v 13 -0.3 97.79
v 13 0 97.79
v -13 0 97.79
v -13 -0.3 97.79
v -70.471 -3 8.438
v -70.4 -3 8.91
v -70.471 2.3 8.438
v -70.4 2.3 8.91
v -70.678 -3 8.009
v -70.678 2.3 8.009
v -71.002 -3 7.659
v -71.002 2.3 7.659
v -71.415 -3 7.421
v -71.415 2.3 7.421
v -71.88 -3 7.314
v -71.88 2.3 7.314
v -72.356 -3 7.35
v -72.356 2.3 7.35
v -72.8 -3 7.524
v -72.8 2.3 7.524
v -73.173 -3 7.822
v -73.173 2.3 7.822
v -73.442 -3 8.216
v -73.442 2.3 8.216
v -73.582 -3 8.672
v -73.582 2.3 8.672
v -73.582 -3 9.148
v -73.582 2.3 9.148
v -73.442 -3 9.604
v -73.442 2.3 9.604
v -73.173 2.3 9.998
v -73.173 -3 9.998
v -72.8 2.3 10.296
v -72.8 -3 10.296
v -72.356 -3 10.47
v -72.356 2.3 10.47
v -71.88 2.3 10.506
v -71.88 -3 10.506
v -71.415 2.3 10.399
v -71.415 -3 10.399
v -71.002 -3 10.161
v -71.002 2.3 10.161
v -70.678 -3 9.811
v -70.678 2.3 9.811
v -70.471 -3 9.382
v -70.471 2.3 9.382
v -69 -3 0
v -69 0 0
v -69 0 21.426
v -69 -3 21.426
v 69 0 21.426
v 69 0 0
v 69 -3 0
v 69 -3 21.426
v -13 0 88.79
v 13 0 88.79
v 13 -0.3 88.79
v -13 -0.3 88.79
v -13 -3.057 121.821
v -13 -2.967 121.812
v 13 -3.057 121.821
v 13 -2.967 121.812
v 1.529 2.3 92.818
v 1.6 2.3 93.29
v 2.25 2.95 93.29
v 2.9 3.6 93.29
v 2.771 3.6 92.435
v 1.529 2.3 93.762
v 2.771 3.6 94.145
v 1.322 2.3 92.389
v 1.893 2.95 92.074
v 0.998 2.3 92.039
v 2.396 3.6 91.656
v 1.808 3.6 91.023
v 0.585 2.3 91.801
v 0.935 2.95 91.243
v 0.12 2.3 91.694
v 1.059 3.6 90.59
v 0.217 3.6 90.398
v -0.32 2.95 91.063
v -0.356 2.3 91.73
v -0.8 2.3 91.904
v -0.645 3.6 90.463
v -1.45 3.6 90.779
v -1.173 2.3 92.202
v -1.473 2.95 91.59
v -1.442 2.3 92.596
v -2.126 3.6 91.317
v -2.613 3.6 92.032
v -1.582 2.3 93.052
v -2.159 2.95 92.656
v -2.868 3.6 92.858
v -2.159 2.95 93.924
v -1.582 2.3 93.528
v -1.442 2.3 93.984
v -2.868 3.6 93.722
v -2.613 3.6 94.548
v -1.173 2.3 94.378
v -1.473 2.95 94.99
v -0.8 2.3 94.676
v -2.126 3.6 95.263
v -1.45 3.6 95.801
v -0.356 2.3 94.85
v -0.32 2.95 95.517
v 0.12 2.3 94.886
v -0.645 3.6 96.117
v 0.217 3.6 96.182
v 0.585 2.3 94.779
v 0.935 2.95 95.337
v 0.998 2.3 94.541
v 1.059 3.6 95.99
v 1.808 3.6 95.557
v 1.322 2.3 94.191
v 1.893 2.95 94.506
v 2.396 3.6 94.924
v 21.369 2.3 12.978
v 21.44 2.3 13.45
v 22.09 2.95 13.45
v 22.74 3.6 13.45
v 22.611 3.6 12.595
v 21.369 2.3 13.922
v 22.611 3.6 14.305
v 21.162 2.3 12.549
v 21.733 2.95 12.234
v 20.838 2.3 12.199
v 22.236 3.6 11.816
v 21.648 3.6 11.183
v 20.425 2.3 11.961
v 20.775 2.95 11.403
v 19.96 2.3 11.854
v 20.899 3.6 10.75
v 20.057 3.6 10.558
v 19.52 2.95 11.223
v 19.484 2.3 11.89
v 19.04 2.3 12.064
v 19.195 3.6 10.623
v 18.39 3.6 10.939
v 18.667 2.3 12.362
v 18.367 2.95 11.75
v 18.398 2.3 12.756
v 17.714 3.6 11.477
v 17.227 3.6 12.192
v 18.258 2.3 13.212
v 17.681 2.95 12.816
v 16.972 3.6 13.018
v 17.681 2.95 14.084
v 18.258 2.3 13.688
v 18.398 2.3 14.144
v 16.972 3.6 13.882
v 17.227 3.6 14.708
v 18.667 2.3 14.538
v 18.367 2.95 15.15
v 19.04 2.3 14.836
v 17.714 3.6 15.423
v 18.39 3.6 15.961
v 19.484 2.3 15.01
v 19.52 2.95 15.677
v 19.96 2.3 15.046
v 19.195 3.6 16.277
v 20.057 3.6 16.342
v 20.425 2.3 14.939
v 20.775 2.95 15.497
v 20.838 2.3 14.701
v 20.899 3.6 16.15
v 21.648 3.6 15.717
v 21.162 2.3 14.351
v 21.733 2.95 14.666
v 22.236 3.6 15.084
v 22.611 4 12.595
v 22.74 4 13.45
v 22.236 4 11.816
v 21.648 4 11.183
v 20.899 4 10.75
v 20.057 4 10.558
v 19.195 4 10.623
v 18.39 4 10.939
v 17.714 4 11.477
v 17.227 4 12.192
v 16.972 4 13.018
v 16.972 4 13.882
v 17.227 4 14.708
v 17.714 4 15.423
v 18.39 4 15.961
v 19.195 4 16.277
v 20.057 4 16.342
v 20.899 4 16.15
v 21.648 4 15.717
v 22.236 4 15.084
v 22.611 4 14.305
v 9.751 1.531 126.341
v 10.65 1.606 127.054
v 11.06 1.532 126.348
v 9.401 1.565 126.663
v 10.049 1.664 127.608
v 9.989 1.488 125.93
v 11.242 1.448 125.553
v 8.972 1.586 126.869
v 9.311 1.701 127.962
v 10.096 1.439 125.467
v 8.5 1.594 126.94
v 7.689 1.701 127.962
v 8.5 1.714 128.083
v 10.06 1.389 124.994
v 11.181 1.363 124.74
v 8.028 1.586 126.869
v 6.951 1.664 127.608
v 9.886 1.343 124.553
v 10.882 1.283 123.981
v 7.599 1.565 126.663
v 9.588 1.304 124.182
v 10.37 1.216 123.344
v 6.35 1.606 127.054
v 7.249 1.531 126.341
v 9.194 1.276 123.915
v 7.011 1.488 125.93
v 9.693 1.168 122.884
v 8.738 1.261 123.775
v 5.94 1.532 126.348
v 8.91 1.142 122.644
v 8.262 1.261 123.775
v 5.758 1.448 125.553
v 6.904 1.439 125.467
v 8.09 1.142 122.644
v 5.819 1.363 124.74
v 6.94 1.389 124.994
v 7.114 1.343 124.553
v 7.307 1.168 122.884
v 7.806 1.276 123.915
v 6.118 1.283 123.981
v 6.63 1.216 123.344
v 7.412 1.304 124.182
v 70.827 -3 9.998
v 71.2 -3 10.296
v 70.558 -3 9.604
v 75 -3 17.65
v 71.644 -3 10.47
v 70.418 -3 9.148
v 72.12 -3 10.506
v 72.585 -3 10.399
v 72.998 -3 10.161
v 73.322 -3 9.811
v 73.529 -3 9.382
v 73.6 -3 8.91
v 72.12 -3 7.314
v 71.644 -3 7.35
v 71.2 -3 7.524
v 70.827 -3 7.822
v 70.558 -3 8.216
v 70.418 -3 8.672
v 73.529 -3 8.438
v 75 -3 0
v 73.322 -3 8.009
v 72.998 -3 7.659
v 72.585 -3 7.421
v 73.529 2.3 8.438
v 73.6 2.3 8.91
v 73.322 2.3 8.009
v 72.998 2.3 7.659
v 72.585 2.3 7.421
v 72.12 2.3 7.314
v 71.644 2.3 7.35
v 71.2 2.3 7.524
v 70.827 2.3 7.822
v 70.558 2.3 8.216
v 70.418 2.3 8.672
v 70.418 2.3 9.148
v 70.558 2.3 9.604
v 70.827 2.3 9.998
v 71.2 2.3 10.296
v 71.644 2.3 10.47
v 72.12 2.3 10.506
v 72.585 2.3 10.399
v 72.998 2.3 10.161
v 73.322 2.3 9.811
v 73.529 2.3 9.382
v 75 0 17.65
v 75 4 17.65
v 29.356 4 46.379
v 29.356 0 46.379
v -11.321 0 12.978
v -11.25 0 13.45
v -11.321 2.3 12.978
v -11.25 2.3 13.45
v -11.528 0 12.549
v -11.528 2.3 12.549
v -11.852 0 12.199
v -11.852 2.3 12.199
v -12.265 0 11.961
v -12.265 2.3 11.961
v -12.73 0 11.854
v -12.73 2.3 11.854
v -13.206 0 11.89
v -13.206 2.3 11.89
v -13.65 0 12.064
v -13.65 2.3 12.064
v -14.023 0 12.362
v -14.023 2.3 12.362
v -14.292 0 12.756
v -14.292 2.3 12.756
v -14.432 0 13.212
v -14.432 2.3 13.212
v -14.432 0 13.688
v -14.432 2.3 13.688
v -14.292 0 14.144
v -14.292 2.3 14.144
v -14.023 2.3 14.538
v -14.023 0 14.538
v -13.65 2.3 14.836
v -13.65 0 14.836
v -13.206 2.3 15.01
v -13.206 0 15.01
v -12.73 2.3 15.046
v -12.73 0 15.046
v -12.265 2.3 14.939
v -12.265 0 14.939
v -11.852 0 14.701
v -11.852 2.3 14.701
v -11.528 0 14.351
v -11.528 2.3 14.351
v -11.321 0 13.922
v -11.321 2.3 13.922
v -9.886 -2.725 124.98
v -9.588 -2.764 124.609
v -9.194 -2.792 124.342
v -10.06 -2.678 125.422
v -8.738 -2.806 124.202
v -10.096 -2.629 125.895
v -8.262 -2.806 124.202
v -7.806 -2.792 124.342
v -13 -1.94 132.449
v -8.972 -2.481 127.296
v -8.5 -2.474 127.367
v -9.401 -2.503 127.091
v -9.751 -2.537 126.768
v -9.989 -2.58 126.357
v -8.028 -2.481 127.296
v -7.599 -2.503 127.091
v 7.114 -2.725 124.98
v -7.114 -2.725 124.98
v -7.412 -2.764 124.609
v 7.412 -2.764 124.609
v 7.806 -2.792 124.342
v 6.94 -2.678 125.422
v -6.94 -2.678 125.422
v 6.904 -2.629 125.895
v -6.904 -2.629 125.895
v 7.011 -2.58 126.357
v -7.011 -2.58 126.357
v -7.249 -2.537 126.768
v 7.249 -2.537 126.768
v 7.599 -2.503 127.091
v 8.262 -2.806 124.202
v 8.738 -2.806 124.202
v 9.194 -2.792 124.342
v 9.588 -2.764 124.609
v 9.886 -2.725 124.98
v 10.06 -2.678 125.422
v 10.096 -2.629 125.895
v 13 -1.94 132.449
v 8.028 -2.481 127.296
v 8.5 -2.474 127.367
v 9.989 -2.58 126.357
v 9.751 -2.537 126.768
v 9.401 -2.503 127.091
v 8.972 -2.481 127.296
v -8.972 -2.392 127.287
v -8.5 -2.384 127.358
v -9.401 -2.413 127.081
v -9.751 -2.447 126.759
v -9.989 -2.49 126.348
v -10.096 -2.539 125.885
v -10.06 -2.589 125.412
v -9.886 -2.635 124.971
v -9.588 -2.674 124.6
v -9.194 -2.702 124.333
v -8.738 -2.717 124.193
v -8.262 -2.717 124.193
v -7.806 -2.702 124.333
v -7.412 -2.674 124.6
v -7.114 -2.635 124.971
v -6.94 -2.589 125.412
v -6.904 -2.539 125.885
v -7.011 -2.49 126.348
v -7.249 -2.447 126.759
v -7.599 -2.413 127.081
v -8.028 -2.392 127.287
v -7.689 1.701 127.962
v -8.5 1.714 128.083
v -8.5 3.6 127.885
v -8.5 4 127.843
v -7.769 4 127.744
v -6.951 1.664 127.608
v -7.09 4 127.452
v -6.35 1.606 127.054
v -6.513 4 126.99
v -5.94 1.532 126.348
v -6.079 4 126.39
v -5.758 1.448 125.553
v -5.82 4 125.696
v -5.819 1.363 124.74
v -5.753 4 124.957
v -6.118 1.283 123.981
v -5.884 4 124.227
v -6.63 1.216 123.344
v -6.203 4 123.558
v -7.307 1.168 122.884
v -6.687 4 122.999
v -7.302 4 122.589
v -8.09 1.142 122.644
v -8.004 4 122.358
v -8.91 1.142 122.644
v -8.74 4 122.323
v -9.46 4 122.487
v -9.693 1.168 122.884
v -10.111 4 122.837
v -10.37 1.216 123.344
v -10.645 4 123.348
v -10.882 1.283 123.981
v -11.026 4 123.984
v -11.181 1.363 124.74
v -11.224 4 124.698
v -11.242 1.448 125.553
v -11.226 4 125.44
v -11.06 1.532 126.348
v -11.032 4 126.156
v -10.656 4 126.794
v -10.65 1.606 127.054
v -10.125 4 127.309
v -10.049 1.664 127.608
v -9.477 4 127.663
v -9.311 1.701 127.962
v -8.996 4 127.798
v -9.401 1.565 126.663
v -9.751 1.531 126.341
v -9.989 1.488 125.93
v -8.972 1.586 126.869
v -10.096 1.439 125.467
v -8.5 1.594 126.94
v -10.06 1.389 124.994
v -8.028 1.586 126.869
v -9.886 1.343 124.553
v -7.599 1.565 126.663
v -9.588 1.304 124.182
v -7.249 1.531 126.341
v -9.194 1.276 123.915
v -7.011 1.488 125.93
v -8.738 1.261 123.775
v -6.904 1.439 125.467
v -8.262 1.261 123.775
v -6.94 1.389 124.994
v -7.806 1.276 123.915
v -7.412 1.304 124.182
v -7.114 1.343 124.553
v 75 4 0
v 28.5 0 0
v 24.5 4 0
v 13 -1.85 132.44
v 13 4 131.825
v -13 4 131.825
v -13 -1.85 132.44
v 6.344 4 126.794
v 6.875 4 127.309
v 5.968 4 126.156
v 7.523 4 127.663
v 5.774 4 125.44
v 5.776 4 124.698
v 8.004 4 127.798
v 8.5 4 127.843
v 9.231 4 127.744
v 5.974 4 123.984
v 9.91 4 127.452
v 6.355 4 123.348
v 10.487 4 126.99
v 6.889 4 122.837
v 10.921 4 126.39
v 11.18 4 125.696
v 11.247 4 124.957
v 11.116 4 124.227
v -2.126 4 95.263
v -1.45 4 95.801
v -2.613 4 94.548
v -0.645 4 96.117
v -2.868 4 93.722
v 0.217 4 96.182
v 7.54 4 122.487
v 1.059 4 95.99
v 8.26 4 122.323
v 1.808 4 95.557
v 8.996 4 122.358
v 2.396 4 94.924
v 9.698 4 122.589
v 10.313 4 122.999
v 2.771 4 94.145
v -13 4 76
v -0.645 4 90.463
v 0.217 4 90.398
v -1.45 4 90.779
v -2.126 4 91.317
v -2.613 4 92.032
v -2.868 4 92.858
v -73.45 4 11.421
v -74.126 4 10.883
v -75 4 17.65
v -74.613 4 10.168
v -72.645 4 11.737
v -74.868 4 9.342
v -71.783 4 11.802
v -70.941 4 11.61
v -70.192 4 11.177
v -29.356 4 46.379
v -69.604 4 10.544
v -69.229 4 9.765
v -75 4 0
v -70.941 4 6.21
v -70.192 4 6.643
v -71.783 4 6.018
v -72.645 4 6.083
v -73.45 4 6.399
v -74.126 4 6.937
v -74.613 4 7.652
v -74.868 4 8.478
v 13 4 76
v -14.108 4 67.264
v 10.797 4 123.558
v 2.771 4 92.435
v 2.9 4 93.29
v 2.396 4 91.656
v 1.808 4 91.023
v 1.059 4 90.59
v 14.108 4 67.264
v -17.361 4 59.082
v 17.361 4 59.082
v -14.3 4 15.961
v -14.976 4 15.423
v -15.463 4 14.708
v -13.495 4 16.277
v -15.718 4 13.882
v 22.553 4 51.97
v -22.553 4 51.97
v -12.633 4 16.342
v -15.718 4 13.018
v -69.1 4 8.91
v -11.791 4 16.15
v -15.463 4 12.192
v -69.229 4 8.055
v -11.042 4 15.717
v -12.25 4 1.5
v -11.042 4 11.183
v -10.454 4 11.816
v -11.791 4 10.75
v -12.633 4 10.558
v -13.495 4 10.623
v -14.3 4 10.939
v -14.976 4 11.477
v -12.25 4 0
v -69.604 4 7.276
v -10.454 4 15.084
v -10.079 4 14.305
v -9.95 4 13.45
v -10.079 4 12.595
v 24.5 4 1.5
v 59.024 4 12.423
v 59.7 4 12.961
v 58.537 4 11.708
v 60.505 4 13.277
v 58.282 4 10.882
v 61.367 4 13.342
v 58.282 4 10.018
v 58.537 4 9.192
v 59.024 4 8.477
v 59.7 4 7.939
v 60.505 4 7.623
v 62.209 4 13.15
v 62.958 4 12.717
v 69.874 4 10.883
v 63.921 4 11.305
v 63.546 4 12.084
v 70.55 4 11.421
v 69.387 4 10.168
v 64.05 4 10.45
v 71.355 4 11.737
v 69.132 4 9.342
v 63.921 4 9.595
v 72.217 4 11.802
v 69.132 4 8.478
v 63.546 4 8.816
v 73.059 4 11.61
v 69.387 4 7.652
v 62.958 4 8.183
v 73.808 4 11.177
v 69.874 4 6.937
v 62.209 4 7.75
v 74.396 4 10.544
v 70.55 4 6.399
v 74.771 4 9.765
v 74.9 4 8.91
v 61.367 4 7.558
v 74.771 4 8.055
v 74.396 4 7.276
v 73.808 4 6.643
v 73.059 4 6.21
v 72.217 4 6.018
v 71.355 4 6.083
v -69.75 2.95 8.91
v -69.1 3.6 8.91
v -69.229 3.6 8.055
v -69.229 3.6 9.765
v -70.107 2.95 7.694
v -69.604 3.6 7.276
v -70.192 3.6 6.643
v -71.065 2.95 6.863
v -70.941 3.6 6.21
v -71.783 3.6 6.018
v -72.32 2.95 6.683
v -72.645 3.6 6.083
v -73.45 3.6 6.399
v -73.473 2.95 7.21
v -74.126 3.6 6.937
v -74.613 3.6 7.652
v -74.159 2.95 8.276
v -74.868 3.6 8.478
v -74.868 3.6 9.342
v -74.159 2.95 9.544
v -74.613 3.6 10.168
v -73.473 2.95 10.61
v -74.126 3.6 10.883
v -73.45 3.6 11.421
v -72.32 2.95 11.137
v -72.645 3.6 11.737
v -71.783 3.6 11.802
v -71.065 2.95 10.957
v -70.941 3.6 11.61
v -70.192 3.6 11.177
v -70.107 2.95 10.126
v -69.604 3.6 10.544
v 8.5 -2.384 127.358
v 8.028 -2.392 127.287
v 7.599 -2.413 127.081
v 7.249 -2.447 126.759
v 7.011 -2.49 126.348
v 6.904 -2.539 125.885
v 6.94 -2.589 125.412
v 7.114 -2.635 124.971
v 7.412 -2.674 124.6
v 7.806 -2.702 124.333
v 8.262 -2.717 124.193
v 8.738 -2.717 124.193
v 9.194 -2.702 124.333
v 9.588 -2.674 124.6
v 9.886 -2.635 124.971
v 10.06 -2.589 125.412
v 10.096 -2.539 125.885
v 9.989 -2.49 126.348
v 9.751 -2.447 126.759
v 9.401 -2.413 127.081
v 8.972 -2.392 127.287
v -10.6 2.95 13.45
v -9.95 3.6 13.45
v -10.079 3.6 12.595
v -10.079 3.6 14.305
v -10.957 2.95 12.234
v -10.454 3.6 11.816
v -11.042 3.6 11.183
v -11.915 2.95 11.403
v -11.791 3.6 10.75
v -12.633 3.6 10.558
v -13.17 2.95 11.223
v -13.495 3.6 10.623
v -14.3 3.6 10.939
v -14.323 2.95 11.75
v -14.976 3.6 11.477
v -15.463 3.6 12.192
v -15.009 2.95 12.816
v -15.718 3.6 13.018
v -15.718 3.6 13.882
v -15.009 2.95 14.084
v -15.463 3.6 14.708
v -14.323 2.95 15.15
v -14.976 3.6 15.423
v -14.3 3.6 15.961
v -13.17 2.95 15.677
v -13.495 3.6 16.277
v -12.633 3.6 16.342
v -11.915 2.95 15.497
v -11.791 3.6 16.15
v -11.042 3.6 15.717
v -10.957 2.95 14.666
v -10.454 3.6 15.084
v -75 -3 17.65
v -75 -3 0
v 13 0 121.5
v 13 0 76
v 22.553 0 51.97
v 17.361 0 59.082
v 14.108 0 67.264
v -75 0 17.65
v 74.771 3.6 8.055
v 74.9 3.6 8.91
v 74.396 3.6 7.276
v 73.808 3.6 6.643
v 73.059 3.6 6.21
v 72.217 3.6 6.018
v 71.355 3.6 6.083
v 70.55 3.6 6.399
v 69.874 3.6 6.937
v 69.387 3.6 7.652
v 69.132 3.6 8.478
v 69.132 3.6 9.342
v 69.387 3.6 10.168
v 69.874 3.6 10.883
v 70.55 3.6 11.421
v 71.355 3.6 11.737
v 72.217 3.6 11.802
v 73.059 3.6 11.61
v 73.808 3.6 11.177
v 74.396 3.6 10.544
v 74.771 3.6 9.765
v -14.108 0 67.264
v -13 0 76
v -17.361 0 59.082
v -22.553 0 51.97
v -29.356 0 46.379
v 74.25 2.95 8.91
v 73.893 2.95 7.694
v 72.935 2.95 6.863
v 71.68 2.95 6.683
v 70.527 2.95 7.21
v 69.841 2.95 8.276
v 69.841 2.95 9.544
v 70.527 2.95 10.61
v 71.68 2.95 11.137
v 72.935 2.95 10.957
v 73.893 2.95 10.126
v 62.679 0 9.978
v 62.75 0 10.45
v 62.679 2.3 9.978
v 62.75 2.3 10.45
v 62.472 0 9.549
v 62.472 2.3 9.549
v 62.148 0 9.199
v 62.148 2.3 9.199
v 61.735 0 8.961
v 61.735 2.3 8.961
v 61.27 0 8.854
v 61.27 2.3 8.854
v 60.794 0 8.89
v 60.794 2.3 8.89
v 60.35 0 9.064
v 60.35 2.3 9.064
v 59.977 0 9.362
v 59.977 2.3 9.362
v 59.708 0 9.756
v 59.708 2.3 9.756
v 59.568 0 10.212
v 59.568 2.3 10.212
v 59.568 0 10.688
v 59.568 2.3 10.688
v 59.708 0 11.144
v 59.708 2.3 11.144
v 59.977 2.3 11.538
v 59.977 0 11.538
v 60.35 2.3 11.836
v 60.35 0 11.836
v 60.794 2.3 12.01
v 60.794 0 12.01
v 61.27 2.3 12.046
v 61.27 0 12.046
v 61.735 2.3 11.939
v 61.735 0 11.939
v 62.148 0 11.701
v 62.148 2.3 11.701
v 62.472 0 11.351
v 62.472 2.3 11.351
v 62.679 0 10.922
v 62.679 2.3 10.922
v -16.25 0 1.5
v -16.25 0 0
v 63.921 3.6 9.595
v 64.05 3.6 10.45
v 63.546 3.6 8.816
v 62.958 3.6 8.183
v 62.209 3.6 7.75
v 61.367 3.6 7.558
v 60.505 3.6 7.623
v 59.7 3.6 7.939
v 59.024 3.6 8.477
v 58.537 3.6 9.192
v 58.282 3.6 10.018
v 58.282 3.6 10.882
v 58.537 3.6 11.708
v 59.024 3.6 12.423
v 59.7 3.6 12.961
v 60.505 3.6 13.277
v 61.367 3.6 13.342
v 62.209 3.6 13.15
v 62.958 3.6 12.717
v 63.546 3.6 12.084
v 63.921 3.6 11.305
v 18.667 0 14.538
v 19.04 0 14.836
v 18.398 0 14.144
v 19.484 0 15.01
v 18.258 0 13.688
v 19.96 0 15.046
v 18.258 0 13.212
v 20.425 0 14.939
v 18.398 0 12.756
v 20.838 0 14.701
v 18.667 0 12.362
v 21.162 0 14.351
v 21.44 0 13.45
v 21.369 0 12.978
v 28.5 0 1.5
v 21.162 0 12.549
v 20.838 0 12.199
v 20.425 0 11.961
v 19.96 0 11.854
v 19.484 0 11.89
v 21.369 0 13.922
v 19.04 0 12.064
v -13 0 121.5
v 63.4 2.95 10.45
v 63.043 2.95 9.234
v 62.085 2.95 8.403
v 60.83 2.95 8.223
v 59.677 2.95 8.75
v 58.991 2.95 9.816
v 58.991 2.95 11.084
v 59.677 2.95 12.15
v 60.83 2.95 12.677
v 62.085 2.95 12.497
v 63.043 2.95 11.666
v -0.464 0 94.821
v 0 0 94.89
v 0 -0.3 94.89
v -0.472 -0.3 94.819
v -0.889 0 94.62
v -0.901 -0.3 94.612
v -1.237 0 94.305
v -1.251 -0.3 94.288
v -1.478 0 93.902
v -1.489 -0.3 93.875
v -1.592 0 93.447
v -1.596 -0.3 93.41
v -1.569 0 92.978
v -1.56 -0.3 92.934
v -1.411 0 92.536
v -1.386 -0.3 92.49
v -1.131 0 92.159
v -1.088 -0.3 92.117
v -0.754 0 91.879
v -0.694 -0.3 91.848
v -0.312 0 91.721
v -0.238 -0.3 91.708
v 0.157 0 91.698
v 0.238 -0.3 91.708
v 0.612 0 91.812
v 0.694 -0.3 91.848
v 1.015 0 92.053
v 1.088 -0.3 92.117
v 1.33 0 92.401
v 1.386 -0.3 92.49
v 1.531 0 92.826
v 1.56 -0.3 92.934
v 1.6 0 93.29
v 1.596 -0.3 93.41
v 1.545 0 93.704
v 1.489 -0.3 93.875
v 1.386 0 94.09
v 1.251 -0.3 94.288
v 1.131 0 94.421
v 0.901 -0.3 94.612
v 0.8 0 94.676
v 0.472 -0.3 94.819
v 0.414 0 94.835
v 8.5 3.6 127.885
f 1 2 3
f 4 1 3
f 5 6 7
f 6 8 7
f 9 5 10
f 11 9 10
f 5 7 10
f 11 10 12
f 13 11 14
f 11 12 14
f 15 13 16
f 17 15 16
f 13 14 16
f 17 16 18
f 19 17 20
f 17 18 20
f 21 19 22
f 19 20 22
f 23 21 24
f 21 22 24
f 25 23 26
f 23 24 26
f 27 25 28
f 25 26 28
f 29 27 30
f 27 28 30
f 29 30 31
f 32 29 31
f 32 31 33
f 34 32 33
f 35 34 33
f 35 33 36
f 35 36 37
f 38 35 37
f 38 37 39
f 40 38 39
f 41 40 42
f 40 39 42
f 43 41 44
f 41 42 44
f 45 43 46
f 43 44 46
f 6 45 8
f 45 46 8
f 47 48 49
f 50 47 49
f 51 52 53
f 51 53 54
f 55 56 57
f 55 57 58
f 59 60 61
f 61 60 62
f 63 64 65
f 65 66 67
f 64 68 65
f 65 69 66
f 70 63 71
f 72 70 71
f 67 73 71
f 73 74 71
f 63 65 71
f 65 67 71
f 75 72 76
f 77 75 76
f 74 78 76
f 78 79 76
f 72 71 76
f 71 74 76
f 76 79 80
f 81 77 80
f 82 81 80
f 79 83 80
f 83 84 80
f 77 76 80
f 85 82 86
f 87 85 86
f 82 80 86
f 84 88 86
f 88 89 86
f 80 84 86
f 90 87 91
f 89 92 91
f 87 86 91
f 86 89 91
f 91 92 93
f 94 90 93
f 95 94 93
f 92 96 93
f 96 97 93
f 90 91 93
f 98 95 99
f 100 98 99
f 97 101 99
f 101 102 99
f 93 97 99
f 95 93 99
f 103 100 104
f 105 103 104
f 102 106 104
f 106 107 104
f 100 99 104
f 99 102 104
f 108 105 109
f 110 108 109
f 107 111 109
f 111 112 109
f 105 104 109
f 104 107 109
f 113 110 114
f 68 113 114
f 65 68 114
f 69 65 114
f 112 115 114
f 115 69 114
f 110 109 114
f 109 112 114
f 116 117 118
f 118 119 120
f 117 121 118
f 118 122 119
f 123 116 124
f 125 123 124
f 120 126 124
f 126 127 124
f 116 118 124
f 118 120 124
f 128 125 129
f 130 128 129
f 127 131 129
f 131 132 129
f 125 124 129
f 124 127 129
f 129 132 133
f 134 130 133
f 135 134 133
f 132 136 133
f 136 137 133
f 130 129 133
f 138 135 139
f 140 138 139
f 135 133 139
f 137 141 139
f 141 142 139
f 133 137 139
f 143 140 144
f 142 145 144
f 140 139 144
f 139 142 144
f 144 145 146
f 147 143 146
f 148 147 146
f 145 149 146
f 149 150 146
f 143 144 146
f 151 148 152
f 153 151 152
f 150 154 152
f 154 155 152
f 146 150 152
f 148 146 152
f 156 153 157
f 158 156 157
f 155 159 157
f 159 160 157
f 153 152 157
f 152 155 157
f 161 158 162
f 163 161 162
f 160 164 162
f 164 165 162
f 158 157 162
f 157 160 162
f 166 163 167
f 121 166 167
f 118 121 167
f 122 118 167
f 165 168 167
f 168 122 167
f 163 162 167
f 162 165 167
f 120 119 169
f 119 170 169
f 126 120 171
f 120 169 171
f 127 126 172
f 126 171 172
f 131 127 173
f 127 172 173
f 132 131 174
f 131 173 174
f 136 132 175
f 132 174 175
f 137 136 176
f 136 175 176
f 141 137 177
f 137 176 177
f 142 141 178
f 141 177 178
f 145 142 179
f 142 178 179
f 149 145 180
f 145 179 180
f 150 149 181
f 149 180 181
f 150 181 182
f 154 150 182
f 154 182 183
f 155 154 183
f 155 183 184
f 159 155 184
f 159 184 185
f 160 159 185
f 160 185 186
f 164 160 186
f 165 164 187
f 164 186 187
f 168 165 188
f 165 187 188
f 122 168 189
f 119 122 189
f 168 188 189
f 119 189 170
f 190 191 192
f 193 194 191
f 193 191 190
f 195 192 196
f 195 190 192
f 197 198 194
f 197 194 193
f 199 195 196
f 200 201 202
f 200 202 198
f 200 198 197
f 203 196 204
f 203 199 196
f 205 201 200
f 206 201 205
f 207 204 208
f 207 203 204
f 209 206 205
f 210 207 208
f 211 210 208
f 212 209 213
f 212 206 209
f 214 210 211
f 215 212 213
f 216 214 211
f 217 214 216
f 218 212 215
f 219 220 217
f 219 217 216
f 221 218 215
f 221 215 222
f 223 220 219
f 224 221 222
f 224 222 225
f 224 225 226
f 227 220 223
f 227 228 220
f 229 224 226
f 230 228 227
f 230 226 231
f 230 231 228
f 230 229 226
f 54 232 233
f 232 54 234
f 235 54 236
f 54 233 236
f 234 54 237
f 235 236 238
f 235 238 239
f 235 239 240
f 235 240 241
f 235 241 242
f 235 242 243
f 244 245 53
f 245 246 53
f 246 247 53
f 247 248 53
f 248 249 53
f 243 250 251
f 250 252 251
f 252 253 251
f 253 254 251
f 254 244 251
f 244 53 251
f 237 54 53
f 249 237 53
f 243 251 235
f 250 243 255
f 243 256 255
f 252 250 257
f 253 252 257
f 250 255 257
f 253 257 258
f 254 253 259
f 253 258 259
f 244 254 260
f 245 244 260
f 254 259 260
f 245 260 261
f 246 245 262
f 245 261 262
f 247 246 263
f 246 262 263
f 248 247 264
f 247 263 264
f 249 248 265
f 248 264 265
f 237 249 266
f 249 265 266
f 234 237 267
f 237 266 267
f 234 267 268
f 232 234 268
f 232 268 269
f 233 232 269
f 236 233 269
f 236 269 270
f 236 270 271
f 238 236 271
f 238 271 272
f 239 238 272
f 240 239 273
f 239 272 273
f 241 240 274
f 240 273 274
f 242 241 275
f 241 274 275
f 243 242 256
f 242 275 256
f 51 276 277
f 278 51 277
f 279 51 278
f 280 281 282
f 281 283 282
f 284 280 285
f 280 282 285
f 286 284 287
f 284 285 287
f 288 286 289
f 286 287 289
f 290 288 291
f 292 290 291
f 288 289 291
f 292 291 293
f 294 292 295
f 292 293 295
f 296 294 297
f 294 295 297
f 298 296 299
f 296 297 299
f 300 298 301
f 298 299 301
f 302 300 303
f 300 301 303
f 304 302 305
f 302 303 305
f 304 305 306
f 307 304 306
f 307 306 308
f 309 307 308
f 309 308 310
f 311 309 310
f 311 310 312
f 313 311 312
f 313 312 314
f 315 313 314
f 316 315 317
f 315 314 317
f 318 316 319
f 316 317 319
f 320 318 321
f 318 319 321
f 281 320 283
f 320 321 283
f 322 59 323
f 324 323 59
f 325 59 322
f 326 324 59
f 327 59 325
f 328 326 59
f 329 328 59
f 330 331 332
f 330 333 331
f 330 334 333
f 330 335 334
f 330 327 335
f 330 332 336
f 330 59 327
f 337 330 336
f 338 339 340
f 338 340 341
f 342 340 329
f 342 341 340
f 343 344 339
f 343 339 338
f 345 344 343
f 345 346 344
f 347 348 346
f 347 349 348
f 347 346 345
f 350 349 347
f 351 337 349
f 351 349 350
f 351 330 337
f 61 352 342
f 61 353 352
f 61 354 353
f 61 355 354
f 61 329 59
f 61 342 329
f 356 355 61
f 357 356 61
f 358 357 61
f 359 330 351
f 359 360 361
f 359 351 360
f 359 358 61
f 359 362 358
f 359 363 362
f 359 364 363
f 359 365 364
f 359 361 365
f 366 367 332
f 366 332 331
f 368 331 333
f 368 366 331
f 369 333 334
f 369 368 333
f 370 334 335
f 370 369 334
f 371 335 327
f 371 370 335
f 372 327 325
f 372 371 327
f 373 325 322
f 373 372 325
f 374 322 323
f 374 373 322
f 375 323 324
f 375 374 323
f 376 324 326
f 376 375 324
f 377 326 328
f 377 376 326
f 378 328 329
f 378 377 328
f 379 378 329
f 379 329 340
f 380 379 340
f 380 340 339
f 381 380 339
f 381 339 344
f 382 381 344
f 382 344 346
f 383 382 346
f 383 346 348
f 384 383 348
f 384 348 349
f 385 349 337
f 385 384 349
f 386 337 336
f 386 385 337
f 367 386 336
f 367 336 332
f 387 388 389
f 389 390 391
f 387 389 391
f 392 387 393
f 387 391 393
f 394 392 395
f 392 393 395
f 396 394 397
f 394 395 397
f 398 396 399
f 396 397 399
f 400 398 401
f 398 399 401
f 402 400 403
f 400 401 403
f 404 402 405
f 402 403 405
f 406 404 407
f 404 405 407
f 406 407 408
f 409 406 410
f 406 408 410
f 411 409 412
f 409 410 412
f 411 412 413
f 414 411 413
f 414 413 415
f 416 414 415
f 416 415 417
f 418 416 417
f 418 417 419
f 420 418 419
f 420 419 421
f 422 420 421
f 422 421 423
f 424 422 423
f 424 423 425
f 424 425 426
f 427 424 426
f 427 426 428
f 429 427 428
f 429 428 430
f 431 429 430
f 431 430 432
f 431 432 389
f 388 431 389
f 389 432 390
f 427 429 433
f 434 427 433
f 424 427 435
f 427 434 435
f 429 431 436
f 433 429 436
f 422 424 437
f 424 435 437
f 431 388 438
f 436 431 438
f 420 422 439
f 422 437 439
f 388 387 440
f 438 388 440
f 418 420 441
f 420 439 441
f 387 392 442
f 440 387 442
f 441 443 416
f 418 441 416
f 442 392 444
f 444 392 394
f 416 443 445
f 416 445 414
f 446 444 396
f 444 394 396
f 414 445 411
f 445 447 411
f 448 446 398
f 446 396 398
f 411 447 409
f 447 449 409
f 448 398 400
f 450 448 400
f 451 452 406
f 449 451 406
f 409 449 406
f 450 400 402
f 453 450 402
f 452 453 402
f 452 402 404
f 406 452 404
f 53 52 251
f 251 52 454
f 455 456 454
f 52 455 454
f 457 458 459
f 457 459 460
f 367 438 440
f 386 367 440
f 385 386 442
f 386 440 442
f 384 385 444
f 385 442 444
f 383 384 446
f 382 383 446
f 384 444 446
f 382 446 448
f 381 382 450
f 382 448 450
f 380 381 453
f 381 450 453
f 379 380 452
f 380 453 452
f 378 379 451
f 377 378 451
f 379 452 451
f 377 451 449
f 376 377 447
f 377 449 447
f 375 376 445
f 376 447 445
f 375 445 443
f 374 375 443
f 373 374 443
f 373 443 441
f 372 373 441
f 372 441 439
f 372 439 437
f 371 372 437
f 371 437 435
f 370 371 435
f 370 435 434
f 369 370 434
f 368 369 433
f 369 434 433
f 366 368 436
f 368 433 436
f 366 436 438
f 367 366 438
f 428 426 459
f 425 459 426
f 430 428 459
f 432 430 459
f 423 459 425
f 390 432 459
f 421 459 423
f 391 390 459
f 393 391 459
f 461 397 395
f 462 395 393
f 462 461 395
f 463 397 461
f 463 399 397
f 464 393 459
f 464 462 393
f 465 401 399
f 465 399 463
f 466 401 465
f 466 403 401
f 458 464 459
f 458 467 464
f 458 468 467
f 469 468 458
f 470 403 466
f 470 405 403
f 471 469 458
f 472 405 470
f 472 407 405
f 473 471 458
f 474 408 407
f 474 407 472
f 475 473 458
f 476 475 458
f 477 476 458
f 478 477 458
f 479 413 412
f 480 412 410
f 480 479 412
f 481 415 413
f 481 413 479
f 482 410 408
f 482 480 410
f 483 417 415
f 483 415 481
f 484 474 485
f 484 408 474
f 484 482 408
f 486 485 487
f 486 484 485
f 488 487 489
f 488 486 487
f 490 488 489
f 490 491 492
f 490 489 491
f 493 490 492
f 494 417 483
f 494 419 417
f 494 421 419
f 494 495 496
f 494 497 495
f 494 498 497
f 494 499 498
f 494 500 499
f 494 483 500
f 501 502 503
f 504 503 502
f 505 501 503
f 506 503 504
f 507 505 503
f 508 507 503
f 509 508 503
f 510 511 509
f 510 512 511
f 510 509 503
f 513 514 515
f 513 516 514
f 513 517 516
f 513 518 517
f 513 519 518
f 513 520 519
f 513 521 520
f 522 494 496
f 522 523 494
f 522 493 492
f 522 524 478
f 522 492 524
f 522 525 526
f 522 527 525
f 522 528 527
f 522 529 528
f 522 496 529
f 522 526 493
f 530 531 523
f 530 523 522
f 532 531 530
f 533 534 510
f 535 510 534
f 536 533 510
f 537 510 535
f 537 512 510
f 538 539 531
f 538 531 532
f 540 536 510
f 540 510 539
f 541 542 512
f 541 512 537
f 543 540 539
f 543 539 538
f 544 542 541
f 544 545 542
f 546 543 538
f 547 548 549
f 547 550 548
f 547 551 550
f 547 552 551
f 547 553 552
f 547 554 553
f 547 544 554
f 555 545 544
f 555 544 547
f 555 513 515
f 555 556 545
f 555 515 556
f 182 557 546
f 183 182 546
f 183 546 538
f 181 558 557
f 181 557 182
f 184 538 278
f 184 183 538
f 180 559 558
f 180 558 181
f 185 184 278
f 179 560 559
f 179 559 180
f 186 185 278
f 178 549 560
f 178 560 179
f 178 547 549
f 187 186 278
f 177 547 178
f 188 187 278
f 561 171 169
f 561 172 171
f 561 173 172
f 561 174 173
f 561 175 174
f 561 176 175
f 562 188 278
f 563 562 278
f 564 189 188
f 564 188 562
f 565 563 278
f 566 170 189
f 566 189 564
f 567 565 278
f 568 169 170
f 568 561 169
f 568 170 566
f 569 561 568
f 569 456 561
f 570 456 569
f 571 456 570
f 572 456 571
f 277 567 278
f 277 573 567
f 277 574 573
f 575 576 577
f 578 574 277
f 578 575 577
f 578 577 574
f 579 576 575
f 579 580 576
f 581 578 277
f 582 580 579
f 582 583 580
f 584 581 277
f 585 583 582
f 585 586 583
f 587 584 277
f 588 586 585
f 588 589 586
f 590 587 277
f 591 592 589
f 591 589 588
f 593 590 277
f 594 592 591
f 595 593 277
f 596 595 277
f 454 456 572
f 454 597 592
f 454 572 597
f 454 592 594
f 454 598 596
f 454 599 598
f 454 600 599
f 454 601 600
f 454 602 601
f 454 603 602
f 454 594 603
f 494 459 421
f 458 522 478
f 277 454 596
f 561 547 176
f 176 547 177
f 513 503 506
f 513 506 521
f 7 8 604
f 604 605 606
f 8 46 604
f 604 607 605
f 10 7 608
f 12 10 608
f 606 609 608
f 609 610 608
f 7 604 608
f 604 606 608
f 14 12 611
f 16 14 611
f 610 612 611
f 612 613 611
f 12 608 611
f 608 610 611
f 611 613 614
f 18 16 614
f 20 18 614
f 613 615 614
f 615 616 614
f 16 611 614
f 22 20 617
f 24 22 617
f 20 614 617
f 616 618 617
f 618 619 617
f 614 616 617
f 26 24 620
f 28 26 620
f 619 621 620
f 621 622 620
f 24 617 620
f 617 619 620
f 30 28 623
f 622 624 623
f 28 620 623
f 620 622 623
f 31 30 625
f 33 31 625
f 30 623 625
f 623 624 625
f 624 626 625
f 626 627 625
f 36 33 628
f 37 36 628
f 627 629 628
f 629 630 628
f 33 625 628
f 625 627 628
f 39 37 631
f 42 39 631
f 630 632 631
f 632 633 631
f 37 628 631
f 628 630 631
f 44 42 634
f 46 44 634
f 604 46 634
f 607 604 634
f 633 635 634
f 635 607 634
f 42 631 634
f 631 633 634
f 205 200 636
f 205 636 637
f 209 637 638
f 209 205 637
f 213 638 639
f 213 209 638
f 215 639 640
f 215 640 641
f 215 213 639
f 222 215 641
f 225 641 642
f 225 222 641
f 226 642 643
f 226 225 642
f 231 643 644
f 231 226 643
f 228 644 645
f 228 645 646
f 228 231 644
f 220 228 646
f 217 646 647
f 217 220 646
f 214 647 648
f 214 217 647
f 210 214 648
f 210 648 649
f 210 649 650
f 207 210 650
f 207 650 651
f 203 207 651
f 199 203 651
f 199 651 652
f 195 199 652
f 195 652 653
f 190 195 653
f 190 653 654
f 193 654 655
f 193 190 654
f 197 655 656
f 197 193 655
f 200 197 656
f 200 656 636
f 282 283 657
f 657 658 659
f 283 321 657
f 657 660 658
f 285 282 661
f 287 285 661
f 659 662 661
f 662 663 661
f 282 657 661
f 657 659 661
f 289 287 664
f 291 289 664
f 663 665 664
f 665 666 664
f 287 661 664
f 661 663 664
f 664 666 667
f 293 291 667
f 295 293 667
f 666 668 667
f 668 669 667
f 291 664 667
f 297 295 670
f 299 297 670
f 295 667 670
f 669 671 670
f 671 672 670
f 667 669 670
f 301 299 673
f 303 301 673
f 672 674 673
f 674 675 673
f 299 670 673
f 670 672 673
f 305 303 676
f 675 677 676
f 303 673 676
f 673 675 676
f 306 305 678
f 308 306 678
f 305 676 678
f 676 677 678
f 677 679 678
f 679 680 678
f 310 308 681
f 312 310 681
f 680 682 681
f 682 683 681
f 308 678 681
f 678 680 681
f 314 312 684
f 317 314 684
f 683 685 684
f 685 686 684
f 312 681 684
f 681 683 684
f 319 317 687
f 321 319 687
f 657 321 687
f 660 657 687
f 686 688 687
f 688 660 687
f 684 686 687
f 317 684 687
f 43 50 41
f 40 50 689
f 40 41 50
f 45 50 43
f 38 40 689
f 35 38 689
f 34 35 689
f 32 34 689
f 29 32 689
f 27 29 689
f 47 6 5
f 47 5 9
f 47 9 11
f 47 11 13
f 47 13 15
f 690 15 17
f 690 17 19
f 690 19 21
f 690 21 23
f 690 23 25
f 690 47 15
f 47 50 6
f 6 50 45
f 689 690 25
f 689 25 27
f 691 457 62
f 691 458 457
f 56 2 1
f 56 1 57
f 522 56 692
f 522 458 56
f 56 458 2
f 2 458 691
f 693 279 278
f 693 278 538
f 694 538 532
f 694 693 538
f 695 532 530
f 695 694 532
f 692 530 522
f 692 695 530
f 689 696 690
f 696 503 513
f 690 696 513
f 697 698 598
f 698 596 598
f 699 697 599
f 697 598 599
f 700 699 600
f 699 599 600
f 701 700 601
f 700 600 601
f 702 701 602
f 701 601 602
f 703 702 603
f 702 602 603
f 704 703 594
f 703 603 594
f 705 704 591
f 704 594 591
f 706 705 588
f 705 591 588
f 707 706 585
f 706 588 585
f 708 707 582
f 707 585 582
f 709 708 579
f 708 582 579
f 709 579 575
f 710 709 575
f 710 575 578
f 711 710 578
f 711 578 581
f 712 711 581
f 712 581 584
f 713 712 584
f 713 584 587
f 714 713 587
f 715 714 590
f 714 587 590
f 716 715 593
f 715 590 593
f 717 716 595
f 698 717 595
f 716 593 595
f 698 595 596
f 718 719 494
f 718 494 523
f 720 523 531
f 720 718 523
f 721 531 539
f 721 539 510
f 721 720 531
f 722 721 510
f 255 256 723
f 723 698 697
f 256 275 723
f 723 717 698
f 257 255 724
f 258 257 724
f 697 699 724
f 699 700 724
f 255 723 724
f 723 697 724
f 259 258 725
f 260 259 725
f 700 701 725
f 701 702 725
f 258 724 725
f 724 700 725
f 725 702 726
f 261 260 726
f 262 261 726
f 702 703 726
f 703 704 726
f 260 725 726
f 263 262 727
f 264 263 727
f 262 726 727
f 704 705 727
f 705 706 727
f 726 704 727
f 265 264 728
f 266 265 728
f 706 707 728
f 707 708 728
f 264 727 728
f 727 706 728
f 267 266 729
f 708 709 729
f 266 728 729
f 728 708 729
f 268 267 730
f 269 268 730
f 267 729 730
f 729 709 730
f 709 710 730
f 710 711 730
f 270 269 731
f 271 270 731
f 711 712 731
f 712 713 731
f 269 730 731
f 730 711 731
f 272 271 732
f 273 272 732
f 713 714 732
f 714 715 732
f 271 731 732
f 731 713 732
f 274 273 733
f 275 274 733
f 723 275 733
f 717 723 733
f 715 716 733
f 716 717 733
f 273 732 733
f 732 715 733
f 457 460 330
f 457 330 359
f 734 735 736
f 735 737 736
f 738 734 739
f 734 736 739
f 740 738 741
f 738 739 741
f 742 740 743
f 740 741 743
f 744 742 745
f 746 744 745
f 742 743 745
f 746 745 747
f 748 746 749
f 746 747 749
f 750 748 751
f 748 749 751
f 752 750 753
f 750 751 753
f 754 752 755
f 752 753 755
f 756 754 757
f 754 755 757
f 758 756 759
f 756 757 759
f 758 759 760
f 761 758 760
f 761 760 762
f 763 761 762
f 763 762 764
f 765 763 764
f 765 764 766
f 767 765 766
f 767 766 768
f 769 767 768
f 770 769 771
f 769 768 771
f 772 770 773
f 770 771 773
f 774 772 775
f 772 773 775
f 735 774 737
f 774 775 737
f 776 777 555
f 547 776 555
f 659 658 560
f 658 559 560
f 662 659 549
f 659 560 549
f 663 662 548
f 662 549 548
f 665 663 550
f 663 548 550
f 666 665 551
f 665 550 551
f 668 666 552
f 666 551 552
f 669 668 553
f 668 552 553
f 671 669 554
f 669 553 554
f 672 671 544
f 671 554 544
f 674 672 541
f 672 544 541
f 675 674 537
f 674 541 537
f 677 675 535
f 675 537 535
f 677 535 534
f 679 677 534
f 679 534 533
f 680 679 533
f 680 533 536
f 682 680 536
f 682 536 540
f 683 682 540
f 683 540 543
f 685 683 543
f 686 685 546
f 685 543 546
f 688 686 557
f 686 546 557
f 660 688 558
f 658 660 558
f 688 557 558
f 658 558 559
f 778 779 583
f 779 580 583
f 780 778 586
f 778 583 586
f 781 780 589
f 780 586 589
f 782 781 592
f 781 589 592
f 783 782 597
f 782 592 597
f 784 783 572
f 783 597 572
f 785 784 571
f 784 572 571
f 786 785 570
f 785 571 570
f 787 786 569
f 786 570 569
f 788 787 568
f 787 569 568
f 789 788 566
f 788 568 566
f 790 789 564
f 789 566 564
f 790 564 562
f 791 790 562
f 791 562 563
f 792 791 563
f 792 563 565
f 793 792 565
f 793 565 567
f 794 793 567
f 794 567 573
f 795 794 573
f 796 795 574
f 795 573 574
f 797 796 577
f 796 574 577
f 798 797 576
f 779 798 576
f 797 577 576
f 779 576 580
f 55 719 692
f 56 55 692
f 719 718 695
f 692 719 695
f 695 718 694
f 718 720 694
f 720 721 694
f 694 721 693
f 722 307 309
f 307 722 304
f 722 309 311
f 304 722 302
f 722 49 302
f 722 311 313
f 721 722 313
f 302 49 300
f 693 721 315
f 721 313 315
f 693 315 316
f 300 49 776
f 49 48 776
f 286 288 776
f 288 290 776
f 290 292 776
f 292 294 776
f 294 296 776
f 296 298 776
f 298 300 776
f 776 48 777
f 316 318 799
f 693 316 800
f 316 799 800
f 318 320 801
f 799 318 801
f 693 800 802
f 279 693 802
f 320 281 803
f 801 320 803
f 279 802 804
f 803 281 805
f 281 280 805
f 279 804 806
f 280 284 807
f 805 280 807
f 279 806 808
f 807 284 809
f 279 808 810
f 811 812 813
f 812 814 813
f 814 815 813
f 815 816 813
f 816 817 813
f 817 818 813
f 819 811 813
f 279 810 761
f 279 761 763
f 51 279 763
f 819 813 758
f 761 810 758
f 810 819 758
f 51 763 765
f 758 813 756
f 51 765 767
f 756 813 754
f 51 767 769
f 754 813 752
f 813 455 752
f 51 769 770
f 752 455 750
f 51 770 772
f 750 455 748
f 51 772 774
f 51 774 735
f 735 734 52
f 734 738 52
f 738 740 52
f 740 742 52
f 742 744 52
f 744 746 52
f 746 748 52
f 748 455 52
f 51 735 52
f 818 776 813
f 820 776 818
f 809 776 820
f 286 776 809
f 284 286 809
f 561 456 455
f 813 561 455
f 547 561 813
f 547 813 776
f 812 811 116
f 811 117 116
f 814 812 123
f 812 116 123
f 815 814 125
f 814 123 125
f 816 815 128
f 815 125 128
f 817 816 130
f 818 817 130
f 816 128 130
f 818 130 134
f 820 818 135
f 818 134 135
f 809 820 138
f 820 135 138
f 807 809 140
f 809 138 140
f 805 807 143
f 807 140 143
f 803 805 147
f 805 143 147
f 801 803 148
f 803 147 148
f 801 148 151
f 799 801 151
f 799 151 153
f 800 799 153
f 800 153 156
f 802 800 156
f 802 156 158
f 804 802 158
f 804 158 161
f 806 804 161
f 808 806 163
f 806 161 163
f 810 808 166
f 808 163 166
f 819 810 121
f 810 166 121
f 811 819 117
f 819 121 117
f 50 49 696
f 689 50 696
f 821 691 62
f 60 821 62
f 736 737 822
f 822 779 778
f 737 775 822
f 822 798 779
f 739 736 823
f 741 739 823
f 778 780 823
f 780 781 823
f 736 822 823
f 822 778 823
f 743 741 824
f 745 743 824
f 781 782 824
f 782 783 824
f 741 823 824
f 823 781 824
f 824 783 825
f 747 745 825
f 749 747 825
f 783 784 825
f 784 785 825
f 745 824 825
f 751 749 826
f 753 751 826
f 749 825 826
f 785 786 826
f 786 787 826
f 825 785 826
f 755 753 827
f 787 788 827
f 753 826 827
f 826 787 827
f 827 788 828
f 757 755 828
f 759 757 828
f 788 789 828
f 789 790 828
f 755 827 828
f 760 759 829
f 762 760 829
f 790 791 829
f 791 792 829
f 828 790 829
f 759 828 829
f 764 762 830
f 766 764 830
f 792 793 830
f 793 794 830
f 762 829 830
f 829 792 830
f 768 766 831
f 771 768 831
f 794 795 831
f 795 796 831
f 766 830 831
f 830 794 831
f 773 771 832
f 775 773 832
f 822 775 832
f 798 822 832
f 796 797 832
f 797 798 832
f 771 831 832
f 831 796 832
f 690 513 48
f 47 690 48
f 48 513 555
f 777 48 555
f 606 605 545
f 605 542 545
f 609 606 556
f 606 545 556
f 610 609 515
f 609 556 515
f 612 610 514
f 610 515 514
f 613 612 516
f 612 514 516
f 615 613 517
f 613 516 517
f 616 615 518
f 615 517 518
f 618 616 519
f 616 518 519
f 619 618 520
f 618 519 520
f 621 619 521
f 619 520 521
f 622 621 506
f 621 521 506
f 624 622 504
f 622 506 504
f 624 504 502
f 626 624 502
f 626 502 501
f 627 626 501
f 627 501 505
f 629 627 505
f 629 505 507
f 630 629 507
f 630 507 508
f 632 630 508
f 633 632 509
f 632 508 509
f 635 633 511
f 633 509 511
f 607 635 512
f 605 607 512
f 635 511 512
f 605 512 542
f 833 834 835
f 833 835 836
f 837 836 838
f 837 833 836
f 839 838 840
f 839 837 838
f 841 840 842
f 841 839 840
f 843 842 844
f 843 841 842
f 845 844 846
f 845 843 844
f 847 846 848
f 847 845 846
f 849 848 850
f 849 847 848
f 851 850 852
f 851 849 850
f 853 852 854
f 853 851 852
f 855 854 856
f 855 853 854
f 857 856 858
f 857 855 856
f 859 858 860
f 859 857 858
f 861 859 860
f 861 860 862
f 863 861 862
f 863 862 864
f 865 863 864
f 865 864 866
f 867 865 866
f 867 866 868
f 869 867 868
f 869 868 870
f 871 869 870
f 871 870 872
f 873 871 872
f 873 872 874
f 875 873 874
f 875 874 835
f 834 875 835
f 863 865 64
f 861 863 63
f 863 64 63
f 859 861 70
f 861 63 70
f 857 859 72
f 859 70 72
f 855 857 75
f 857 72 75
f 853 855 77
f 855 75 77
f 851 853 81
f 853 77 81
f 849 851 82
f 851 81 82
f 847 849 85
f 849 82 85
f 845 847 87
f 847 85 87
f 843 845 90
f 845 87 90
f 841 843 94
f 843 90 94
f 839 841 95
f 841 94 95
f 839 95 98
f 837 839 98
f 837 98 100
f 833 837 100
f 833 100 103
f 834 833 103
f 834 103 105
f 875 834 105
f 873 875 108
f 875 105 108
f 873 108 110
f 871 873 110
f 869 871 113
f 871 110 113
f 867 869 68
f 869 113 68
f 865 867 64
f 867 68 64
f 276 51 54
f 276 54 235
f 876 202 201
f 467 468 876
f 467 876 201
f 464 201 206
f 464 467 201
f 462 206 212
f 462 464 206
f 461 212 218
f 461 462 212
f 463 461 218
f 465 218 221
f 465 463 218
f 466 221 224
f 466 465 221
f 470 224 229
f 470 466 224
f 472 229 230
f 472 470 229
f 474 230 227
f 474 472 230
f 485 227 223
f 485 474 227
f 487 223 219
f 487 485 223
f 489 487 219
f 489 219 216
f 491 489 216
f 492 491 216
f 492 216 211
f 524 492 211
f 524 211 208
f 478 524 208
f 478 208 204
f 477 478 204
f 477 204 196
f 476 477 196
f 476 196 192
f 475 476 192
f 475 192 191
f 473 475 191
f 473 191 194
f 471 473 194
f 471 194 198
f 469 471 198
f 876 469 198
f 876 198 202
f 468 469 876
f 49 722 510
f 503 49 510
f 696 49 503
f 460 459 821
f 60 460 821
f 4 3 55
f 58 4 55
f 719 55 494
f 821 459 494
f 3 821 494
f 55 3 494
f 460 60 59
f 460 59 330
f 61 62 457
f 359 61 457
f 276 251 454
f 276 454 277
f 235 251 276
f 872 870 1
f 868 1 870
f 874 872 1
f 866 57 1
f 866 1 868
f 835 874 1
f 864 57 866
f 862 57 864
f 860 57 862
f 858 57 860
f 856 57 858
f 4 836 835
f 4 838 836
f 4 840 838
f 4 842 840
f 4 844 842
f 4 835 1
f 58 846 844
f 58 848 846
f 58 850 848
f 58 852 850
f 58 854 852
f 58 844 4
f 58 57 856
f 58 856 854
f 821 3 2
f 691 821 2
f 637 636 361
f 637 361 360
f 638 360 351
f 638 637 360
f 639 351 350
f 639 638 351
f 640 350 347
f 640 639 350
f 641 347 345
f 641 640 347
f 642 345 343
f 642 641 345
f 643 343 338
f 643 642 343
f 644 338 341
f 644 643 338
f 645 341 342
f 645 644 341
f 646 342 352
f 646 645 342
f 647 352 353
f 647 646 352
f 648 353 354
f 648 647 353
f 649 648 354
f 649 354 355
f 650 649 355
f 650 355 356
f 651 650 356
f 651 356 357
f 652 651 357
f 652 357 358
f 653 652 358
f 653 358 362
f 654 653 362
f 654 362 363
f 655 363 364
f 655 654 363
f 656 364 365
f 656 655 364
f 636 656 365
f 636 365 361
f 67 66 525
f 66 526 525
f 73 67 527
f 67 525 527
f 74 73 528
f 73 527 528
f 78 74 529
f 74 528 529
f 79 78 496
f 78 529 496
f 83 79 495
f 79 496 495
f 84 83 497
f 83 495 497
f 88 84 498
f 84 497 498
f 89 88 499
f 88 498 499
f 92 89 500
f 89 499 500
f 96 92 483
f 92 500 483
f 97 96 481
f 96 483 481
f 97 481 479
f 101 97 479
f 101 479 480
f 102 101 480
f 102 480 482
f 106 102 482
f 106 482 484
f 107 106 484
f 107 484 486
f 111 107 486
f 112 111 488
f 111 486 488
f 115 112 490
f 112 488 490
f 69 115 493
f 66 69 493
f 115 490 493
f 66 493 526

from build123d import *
from build123d.topology import SkipClean

# Parameters (mm, degrees)
BOSS_EXTRU_1_DEPTH                   = 4
BOSS_EXTRU_6_DEPTH                   = 3
ENL_V_MAT_EXTRU_9_DEPTH              = 1.5
ESQUISSE18_W                         = 26
ESQUISSE18_H                         = 4
BOSS_EXTRU_5_DEPTH                   = 3.5
ESQUISSE24_W                         = 26
ESQUISSE24_H                         = 9
ESQUISSE24_R                         = 1.6
BOSS_EXTRU_7_DEPTH                   = 0.3
ESQUISSE25_W                         = 26
ESQUISSE25_H                         = 12
BOSS_EXTRU_8_DEPTH                   = 3
ENL_V_MAT_EXTRU_13_REACH             = 155.177
ENL_V_MAT_EXTRU_13_DIRECTION_2_REACH = 155.177
ENL_V_MAT_EXTRU_14_REACH             = 155.177
ENL_V_MAT_EXTRU_14_DIRECTION_2_REACH = 155.177
ENL_V_MAT_EXTRU_15_REACH             = 161.061
ESQUISSE38_W                         = 26
ESQUISSE38_H                         = 10.68641461
ESQUISSE38_R                         = 1.6
BOSS_EXTRU_10_DEPTH                  = 0.09


# Read off the part's stored shape, not the designer's step: Fraisage pour vis à tête fraisée à 6 pans creux M31
with BuildPart() as part:
    # Esquisse1 → Boss.-Extru.1 (new body)
    with BuildSketch(Plane(origin=(0, 0, 0), x_dir=(1, 0, 0), z_dir=(0, 1, 0))):
        with BuildLine():
            Line((-13, -130), (-13, -76))
            ThreePointArc((-13, -76), (-17.360668588, -59.081626241), (-29.356078322, -46.378990826))
            Line((-29.356078322, -46.378990826), (-75, -17.65))
            Line((-75, -17.65), (-75, 0))
            Line((-75, 0), (75, 0))
            Line((75, 0), (75, -17.65))
            Line((75, -17.65), (29.356078322, -46.378990826))
            ThreePointArc((29.356078322, -46.378990826), (17.360668588, -59.081626241), (13, -76))
            Line((13, -76), (13, -130))
            Line((13, -130), (-13, -130))
        make_face()
    extrude(amount=BOSS_EXTRU_1_DEPTH)

    # Esquisse21 → Boss.-Extru.6 (add)
    with BuildSketch(Plane(origin=(0, 0, 0), x_dir=(-1, 0, 0), z_dir=(0, -1, 0))):
        Polygon((75, 0), (69, 0), (69, -21.426492874), (75, -17.65), align=None)
        Polygon((-75, 0), (-69, 0), (-69, -21.426492874), (-75, -17.65), align=None)
    extrude(amount=BOSS_EXTRU_6_DEPTH)

    # Fraisage pour vis _ t_te frais_e _ 6 2 → Fraisage pour vis à tête fraisée à 6 pans creux M31 (revolve, cut)
    with BuildSketch(Plane.XY.offset(93.29)):
        Polygon((0, 0), (1.6, 0), (1.6, 2.3), (2.9, 3.6), (2.9, 4), (0, 4), align=None)
    revolve(axis=Axis((0, 0, 93.29), (0, 1, 0)), mode=Mode.SUBTRACT)

    # Fraisage pour vis _ t_te frais_e _ 6 3 o → Fraisage pour vis _ t_te frais_e _ 6 3 (revolve, cut)
    with BuildSketch(Plane(origin=(-72, 0, 8.91), x_dir=(1, 0, 0), z_dir=(0, 0, 1))):
        Polygon((0, -3), (1.6, -3), (1.6, 2.3), (2.9, 3.6), (2.9, 4), (0, 4), align=None)
    revolve(axis=Axis((-72, 0, 8.91), (0, 1, 0)), mode=Mode.SUBTRACT)

    # Fraisage pour vis _ t_te frais_e _ 6 4 o → Fraisage pour vis _ t_te frais_e _ 6 4 (revolve, cut)
    with BuildSketch(Plane(origin=(72, 0, 8.91), x_dir=(1, 0, 0), z_dir=(0, 0, 1))):
        Polygon((0, -3), (1.6, -3), (1.6, 2.3), (2.9, 3.6), (2.9, 4), (0, 4), align=None)
    revolve(axis=Axis((72, 0, 8.91), (0, 1, 0)), mode=Mode.SUBTRACT)

    # Fraisage pour vis _ t_te frais_e _ 6 5 o → Fraisage pour vis _ t_te frais_e _ 6 5 (revolve, cut)
    with BuildSketch(Plane(origin=(19.84, 0, 13.45), x_dir=(1, 0, 0), z_dir=(0, 0, 1))):
        Polygon((0, 0), (1.6, 0), (1.6, 2.3), (2.9, 3.6), (2.9, 4), (0, 4), align=None)
    revolve(axis=Axis((19.84, 0, 13.45), (0, 1, 0)), mode=Mode.SUBTRACT)

    # Fraisage pour vis _ t_te frais_e _ 6 6 o → Fraisage pour vis _ t_te frais_e _ 6 6 (revolve, cut)
    with BuildSketch(Plane(origin=(-12.85, 0, 13.45), x_dir=(1, 0, 0), z_dir=(0, 0, 1))):
        Polygon((0, 0), (1.6, 0), (1.6, 2.3), (2.9, 3.6), (2.9, 4), (0, 4), align=None)
    revolve(axis=Axis((-12.85, 0, 13.45), (0, 1, 0)), mode=Mode.SUBTRACT)

    # Fraisage pour vis _ t_te frais_e _ 6 7 o → Fraisage pour vis _ t_te frais_e _ 6 7 (revolve, cut)
    with BuildSketch(Plane(origin=(61.15, 0, 10.45), x_dir=(1, 0, 0), z_dir=(0, 0, 1))):
        Polygon((0, 0), (1.6, 0), (1.6, 2.3), (2.9, 3.6), (2.9, 4), (0, 4), align=None)
    revolve(axis=Axis((61.15, 0, 10.45), (0, 1, 0)), mode=Mode.SUBTRACT)

    # Esquisse16 → Enlèv. mat.-Extru.9 (cut)
    with BuildSketch(Plane(origin=(0, 0, 0), x_dir=(-1, 0, 0), z_dir=(0, 0, -1))):
        Polygon((16.25, 0), (12.25, 4), (-24.5, 4), (-28.5, 0), align=None)
    extrude(amount=-ENL_V_MAT_EXTRU_9_DEPTH, mode=Mode.SUBTRACT)

    # Esquisse18 → Boss.-Extru.5 (add)
    with BuildSketch(Plane.XY.offset(130)):
        with Locations((0, 2)):
            Rectangle(ESQUISSE18_W, ESQUISSE18_H)
    extrude(amount=BOSS_EXTRU_5_DEPTH)

    # Esquisse24 → Boss.-Extru.7 (add)
    with SkipClean():  # the faces are left unmerged after this step: merging them gives an invalid solid
        with BuildSketch(Plane(origin=(0, 0, 0), x_dir=(-1, 0, 0), z_dir=(0, -1, 0))):
            with Locations((0, -93.29)):
                Rectangle(ESQUISSE24_W, ESQUISSE24_H)
            with Locations(Location((0, -93.29, 0), (0, 0, 270))):
                Circle(ESQUISSE24_R, mode=Mode.SUBTRACT)
        extrude(amount=BOSS_EXTRU_7_DEPTH)

    # Esquisse25 → Boss.-Extru.8 (add)
    with SkipClean():  # the faces are left unmerged after this step: merging them gives an invalid solid
        with BuildSketch(Plane(origin=(0, 0, 0), x_dir=(-1, 0, 0), z_dir=(0, -1, 0))):
            with Locations((0, -127.5)):
                Rectangle(ESQUISSE25_W, ESQUISSE25_H)
        extrude(amount=BOSS_EXTRU_8_DEPTH)

    # Esquisse26 → Enlèv. mat.-Extru.13 (cut, up to next)
    with BuildSketch(Plane(origin=(0, 0, 0), x_dir=(0, 0, -1), z_dir=(1, 0, 0)), mode=Mode.PRIVATE) as enl_v_mat_extru_13_sk1:
        Polygon((-121.5, -3), (-133.5, -1.738749177), (-133.5, -3), align=None)
    enl_v_mat_extru_13_tool1 = extrude(enl_v_mat_extru_13_sk1.sketch, amount=-ENL_V_MAT_EXTRU_13_REACH, mode=Mode.PRIVATE) & part.part
    add(enl_v_mat_extru_13_tool1.solids().sort_by_distance((0, -2.579583, 129.5))[0], mode=Mode.SUBTRACT)

    # Esquisse26 → Enlèv. mat.-Extru.13 direction 2 (cut, up to next)
    with BuildSketch(Plane(origin=(0, 0, 0), x_dir=(0, 0, -1), z_dir=(1, 0, 0)), mode=Mode.PRIVATE) as enl_v_mat_extru_13_direction_2_sk1:
        Polygon((-121.5, -3), (-133.5, -1.738749177), (-133.5, -3), align=None)
    enl_v_mat_extru_13_direction_2_tool1 = extrude(enl_v_mat_extru_13_direction_2_sk1.sketch, amount=ENL_V_MAT_EXTRU_13_DIRECTION_2_REACH, mode=Mode.PRIVATE) & part.part
    add(enl_v_mat_extru_13_direction_2_tool1.solids().sort_by_distance((0, -2.579583, 129.5))[0], mode=Mode.SUBTRACT)

    # Esquisse34 → Enlèv. mat.-Extru.14 (cut, up to next)
    with BuildSketch(Plane(origin=(0, 0, 0), x_dir=(0, 0, -1), z_dir=(1, 0, 0)), mode=Mode.PRIVATE) as enl_v_mat_extru_14_sk1:
        Polygon((-133.5, 4), (-131.824861428, 4), (-132.439740849, -1.850186904), (-133.5, -1.738749177), align=None)
    enl_v_mat_extru_14_tool1 = extrude(enl_v_mat_extru_14_sk1.sketch, amount=-ENL_V_MAT_EXTRU_14_REACH, mode=Mode.PRIVATE) & part.part
    add(enl_v_mat_extru_14_tool1.solids().sort_by_distance((0, 1.317192, 132.802089))[0], mode=Mode.SUBTRACT)

    # Esquisse34 → Enlèv. mat.-Extru.14 direction 2 (cut, up to next)
    with BuildSketch(Plane(origin=(0, 0, 0), x_dir=(0, 0, -1), z_dir=(1, 0, 0)), mode=Mode.PRIVATE) as enl_v_mat_extru_14_direction_2_sk1:
        Polygon((-133.5, 4), (-131.824861428, 4), (-132.439740849, -1.850186904), (-133.5, -1.738749177), align=None)
    enl_v_mat_extru_14_direction_2_tool1 = extrude(enl_v_mat_extru_14_direction_2_sk1.sketch, amount=ENL_V_MAT_EXTRU_14_DIRECTION_2_REACH, mode=Mode.PRIVATE) & part.part
    add(enl_v_mat_extru_14_direction_2_tool1.solids().sort_by_distance((0, 1.317192, 132.802089))[0], mode=Mode.SUBTRACT)

    # Esquisse33 → Enlèvement de matière-Révolution1 (revolve, cut)
    with SkipClean():  # the faces are left unmerged after this step: merging them gives an invalid solid
        with BuildSketch(Plane(origin=(8.5, 0, 0), x_dir=(0, 0, -1), z_dir=(1, 0, 0))):
            Polygon((-124.928461333, 5.421822245), (-125.766498931, -2.551572893), (-127.357733964, -2.384327351), (-126.939620111, 1.59376023), (-128.08332029, 1.713967963), (-127.885090335, 3.6), (-127.663396545, 5.709275519), align=None)
        enl_vement_de_mati_re_r_volution1 = revolve(axis=Axis((8.5, 5.421822245, 124.928461333), (0, -0.9945218953682737, 0.10452846326764909)), mode=Mode.SUBTRACT)

    # Symétrie1: Enlèvement de matière-Révolution1 across plane
    with SkipClean():  # the faces are left unmerged after this step: merging them gives an invalid solid
        add(enl_vement_de_mati_re_r_volution1.mirror(Plane(origin=(0, 0, 0), x_dir=(0, 0, 1), z_dir=(1, 0, 0))), mode=Mode.SUBTRACT)

    # Esquisse37 → Enlèv. mat.-Extru.15 (cut, up to next)
    with BuildSketch(Plane(origin=(13, 0, 0), x_dir=(0, 0, -1), z_dir=(1, 0, 0)), mode=Mode.PRIVATE) as enl_v_mat_extru_15_sk1:
        Polygon((-121.5, 0), (-121.811867536, -2.967221401), (-121.5, -3), align=None)
    enl_v_mat_extru_15_tool1 = extrude(enl_v_mat_extru_15_sk1.sketch, amount=-ENL_V_MAT_EXTRU_15_REACH, mode=Mode.PRIVATE) & part.part
    add(enl_v_mat_extru_15_tool1.solids().sort_by_distance((13, -1.989074, 121.603956))[0], mode=Mode.SUBTRACT)

    # Esquisse38 → Boss.-Extru.10 (add)
    with SkipClean():  # the faces are left unmerged after this step: merging them gives an invalid solid
        with BuildSketch(Plane(origin=(0, -15.597856618, 1.639400792), x_dir=(1, 0, 0), z_dir=(0, -0.9945218953682737, 0.10452846326765036))):
            with Locations((0, 126.177617592)):
                Rectangle(ESQUISSE38_W, ESQUISSE38_H)
            with Locations(Location((-8.5, 124.810824897, 0), (0, 0, 90))):
                Circle(ESQUISSE38_R, mode=Mode.SUBTRACT)
            with Locations(Location((8.5, 124.810824897, 0), (0, 0, 90))):
                Circle(ESQUISSE38_R, mode=Mode.SUBTRACT)
        extrude(amount=BOSS_EXTRU_10_DEPTH)


solid = part.part
